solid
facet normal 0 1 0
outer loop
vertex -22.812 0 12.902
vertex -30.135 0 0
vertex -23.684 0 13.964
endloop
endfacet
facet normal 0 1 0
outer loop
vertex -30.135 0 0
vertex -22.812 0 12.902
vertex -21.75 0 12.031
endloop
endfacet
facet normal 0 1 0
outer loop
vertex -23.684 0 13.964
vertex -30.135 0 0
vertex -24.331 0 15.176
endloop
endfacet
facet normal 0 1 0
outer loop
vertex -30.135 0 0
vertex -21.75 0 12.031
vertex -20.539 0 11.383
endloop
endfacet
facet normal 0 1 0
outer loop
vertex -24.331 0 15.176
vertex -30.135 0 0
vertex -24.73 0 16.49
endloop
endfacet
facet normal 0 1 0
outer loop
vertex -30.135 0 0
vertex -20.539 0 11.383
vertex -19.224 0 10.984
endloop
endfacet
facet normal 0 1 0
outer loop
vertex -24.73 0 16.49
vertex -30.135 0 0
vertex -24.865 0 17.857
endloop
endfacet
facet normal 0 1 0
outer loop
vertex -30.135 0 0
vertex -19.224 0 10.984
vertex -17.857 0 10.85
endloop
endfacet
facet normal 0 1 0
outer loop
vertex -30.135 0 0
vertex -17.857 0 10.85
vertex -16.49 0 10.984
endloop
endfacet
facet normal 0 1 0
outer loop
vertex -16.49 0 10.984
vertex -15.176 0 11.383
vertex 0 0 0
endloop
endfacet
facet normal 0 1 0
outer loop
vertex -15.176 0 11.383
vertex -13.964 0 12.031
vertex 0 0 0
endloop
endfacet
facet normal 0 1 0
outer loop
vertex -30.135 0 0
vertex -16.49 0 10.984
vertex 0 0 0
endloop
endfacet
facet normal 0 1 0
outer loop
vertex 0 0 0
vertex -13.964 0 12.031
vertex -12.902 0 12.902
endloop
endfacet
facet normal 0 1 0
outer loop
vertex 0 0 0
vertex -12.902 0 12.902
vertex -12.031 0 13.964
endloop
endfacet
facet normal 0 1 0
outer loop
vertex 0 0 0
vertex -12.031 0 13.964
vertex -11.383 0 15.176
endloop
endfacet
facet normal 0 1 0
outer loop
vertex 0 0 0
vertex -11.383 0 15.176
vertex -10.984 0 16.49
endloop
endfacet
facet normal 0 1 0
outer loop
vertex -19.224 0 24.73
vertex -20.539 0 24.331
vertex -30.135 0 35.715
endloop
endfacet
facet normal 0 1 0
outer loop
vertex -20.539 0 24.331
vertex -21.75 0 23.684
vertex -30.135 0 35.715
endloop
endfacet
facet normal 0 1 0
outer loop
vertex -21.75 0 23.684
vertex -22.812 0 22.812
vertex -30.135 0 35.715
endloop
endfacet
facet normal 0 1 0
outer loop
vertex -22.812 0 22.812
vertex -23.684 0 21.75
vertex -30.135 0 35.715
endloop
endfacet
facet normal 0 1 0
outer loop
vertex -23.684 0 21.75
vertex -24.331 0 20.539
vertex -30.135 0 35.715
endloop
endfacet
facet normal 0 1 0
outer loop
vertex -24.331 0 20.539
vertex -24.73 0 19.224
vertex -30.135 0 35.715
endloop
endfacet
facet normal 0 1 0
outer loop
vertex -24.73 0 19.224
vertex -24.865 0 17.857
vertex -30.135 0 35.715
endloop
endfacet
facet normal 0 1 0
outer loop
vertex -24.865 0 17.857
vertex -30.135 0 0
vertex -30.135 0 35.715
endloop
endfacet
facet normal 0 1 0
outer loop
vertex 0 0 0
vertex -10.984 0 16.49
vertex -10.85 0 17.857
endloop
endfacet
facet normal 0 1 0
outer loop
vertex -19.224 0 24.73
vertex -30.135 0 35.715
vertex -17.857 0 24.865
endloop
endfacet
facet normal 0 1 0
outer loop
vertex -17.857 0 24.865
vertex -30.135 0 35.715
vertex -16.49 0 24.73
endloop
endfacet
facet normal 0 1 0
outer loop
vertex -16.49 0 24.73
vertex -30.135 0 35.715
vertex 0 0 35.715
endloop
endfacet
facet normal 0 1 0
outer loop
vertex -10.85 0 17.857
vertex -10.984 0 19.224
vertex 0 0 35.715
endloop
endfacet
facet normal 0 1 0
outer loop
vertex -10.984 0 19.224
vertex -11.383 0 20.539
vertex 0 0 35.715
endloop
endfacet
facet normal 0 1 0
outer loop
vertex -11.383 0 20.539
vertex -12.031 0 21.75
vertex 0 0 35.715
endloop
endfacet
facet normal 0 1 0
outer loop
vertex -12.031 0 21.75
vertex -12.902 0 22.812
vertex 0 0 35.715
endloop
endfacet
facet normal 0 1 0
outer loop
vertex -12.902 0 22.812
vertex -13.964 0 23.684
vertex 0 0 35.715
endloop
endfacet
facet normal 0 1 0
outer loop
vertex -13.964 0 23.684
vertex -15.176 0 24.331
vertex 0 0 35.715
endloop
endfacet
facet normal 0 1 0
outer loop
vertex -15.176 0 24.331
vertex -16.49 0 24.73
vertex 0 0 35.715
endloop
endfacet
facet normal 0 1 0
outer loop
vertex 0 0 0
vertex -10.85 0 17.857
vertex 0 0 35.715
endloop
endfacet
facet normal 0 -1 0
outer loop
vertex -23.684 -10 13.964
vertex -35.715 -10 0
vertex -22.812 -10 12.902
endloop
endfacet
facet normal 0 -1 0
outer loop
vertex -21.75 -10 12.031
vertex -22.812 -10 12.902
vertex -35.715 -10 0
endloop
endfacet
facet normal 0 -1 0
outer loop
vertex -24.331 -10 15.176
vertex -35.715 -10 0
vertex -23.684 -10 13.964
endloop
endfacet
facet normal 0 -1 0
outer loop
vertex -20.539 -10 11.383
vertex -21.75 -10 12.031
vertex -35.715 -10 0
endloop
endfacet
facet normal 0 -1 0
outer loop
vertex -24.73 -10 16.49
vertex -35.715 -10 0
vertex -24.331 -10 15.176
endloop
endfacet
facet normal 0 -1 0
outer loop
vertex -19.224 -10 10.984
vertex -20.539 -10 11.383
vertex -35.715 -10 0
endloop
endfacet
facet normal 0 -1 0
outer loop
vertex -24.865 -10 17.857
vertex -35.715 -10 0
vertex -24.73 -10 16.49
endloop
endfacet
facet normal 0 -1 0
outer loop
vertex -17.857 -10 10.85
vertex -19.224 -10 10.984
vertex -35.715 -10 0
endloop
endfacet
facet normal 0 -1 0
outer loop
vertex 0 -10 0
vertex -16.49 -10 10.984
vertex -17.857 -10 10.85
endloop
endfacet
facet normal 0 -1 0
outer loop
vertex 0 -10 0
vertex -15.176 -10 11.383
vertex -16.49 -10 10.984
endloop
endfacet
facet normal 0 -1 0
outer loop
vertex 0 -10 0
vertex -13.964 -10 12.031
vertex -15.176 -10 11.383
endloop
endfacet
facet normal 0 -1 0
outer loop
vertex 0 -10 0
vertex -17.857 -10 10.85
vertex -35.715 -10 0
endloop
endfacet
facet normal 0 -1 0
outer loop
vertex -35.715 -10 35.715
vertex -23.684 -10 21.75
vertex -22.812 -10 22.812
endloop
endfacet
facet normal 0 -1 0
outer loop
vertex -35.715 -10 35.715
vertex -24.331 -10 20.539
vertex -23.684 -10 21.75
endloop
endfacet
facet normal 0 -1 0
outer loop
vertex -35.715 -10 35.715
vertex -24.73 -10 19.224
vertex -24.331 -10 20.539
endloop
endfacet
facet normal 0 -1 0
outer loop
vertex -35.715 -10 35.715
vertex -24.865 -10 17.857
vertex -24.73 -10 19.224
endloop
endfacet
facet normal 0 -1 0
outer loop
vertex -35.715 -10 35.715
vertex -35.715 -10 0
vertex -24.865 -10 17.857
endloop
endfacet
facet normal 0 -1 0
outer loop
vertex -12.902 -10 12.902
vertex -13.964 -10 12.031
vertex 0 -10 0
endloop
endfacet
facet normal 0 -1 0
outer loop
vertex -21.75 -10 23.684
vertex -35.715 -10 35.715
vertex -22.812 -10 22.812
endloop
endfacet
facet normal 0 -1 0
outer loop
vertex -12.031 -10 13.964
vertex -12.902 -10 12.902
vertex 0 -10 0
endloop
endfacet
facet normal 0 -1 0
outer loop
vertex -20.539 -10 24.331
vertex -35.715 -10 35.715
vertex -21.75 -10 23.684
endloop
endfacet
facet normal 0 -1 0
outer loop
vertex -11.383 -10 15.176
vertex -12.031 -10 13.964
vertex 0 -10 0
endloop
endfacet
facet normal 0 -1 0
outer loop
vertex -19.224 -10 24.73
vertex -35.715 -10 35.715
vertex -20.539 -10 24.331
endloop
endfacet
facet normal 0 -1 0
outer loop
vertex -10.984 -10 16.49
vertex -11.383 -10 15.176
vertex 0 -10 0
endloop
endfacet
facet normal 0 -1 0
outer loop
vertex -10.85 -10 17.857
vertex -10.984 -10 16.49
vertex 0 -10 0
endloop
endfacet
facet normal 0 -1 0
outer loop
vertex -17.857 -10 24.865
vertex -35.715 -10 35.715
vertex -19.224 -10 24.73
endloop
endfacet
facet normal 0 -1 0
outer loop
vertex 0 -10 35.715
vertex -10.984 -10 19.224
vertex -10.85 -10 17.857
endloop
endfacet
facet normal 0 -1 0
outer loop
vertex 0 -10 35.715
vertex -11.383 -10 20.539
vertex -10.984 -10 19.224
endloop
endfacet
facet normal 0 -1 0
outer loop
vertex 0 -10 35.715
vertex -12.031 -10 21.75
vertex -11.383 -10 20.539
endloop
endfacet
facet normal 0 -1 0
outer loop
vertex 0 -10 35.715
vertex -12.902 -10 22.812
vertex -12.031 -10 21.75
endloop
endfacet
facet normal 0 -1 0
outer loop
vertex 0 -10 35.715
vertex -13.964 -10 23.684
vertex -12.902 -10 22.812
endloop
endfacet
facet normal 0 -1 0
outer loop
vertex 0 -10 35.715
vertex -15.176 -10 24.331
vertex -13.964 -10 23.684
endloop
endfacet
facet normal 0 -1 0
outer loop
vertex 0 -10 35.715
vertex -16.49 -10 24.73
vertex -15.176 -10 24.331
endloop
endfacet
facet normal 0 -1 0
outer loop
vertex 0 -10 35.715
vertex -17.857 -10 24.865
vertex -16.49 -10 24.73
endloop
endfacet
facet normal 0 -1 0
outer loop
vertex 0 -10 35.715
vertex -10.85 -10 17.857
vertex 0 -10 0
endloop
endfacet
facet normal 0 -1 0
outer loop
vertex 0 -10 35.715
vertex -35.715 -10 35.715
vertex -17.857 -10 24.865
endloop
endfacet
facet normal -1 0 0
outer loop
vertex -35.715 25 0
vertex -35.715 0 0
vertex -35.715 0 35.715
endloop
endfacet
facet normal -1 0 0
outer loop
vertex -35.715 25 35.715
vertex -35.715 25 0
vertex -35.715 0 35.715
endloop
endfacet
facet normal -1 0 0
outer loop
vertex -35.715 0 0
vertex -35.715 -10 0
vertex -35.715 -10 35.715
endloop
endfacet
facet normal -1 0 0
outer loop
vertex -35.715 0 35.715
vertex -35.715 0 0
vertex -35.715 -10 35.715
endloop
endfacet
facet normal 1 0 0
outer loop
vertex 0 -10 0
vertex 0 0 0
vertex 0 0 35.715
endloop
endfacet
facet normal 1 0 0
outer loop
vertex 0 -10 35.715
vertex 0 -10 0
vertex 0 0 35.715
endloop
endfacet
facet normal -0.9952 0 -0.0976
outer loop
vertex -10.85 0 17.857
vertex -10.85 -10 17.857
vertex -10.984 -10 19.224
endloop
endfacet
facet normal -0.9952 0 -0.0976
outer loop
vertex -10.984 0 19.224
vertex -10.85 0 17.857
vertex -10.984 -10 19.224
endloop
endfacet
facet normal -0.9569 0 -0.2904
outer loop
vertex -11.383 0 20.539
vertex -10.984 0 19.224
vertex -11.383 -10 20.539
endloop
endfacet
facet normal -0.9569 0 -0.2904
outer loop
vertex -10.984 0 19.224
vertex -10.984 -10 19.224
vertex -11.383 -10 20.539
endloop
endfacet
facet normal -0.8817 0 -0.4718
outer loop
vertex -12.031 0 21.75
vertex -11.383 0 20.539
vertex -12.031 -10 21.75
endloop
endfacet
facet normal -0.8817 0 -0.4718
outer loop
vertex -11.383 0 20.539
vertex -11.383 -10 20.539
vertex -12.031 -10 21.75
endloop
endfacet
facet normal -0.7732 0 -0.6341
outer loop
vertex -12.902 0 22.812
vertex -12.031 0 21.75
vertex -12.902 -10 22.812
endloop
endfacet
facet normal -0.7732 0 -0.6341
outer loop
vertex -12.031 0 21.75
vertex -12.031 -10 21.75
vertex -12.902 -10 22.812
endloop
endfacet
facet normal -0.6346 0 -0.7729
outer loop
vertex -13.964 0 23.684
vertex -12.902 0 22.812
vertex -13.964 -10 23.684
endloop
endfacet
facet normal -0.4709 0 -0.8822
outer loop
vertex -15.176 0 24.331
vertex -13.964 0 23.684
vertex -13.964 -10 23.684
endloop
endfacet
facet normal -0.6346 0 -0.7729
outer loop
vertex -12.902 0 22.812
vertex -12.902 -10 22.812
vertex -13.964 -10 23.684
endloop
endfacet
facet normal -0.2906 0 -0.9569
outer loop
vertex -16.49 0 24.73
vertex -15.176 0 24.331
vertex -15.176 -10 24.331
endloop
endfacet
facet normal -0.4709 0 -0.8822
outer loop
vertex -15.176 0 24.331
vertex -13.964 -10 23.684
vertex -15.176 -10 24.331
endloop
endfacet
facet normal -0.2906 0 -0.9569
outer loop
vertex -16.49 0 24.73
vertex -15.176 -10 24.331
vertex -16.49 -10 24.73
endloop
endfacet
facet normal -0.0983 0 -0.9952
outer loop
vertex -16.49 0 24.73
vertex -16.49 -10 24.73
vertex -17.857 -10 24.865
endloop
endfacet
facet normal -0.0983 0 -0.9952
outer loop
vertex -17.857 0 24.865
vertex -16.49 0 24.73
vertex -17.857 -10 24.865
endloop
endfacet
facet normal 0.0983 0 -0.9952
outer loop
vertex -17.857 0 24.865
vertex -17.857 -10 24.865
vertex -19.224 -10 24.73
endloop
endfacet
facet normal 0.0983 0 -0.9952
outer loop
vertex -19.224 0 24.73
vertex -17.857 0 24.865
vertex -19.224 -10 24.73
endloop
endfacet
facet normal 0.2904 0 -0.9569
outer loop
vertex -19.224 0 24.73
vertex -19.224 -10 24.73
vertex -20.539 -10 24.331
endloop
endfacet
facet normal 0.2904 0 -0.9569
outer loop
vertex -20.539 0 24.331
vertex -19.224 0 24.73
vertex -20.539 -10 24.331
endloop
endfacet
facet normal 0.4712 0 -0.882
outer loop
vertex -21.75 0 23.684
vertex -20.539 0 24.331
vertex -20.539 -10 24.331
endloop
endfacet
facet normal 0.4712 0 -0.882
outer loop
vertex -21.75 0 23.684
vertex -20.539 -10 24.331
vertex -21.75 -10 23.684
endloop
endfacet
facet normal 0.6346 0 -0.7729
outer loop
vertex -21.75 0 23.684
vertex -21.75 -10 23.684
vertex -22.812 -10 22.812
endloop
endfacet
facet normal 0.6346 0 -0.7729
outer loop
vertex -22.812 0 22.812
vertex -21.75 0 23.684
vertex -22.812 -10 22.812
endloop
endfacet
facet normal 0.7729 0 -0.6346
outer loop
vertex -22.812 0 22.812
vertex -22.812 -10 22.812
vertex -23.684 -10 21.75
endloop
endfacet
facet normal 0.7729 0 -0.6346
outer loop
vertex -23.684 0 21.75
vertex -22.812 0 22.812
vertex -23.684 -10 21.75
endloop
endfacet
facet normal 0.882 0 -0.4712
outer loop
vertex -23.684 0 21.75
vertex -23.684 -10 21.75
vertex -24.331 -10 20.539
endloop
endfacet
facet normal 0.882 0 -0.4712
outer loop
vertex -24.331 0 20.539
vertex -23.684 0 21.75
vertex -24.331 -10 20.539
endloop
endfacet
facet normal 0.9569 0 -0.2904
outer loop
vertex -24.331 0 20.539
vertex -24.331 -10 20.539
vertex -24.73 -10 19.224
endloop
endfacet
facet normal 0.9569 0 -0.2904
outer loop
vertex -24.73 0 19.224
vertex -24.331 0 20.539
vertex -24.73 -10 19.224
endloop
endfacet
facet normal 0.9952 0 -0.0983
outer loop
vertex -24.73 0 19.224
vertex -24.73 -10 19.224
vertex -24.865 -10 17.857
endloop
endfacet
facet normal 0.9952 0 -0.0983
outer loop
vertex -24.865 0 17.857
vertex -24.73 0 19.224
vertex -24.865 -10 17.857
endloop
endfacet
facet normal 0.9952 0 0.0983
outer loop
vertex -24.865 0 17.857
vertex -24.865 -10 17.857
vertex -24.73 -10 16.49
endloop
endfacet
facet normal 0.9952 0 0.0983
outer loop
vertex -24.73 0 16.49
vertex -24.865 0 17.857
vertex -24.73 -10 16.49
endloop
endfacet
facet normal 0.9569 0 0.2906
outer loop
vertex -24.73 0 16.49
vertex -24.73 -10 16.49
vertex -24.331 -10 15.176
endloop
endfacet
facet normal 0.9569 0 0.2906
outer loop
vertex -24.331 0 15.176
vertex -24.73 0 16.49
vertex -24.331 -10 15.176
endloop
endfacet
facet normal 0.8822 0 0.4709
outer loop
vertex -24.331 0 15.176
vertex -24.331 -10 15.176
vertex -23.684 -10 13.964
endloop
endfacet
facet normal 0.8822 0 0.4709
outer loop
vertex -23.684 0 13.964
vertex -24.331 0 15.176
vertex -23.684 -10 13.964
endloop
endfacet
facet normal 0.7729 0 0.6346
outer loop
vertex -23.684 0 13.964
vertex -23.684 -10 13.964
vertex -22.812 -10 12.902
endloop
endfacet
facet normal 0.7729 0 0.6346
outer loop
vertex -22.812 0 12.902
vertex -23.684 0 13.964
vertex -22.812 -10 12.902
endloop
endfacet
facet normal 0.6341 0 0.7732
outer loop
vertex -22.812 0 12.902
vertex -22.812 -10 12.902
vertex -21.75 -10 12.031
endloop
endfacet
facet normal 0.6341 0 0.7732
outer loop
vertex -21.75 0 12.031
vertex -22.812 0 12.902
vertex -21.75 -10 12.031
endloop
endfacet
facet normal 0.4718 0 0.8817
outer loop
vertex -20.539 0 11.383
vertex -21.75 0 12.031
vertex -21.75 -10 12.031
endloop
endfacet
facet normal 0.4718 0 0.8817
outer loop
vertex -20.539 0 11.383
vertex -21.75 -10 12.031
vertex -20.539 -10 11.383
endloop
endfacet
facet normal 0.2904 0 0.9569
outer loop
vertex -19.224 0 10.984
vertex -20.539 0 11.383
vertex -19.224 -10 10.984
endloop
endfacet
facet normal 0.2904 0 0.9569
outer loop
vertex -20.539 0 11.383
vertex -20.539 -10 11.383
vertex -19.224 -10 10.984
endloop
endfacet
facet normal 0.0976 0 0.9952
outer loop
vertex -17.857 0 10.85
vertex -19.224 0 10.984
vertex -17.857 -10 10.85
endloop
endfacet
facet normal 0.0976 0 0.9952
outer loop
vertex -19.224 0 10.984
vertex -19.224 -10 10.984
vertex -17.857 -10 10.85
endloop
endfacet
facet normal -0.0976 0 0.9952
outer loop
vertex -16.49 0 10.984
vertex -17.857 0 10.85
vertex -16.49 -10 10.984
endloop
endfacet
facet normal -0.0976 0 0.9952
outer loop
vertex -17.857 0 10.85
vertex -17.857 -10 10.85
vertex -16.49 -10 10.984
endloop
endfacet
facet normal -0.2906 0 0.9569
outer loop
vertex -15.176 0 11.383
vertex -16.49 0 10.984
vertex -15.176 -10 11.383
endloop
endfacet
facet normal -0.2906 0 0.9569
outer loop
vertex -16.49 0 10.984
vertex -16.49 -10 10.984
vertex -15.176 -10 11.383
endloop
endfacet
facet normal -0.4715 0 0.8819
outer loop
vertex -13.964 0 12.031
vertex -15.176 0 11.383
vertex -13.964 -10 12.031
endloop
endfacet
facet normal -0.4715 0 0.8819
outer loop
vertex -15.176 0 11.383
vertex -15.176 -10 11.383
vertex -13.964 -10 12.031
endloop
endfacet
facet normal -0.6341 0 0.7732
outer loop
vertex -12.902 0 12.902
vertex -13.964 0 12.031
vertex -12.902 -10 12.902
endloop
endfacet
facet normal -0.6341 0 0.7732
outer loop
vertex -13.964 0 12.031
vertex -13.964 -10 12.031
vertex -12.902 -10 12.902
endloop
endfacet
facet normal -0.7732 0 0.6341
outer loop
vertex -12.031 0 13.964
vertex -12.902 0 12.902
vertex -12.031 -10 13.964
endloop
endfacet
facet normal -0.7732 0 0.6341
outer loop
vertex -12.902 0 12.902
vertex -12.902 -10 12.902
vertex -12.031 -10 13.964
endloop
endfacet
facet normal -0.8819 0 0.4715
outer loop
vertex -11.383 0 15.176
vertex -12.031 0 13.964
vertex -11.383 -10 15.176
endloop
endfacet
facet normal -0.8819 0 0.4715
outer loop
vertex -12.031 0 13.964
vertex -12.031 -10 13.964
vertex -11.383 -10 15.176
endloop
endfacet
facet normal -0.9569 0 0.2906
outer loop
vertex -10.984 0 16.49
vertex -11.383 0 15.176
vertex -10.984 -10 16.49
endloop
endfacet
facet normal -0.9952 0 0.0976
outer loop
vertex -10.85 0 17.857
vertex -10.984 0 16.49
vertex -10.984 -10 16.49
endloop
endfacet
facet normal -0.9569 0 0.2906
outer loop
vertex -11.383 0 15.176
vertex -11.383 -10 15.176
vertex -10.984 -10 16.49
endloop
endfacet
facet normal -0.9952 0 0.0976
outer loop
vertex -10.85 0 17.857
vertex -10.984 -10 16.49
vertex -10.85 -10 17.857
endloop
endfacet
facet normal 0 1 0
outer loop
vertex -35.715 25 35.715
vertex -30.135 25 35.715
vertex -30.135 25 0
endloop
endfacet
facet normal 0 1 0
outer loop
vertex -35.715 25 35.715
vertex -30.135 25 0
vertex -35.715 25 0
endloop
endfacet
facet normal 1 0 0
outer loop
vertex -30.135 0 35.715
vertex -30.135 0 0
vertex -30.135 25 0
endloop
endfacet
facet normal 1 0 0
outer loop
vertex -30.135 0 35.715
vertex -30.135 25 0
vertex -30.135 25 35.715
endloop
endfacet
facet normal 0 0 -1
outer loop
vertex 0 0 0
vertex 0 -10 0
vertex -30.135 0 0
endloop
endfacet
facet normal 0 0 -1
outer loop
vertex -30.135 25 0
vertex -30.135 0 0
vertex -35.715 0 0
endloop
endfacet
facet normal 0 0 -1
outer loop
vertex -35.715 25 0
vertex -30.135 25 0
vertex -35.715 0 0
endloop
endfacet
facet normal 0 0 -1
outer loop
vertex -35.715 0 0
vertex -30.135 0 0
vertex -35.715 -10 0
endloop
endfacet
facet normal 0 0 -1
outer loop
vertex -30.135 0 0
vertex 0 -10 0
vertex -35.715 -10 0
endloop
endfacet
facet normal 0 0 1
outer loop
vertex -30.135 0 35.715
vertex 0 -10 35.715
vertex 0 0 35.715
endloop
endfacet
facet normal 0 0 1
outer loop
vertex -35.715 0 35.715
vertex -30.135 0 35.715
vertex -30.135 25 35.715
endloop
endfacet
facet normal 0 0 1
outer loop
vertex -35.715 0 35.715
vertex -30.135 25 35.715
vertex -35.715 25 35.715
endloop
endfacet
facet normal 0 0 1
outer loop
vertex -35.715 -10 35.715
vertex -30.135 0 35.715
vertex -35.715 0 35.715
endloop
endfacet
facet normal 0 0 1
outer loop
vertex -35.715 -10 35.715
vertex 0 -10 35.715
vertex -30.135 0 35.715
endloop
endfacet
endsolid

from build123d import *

# Parameters (mm, degrees)
F0_W     = 35.7145108283
F0_H     = 35.7145108283
F1_DEPTH = 10
F2_R     = 7.0075928512
F3_DEPTH = 25
F4_W     = 5.5791772902
F4_H     = 35.7145108283
F5_DEPTH = 25


with BuildPart() as f1:
    # F0 (on Front) → F1 (new body)
    with BuildSketch(Plane.XZ):
        with Locations((-17.8572554141, 17.8572554141)):
            Rectangle(F0_W, F0_H)
    extrude(amount=F1_DEPTH)

    # F2 (on face) → F3 (cut)
    with BuildSketch(Plane.XZ.offset(10)):
        with Locations((-17.8572554141, 17.8572554141)):
            Circle(F2_R)
    extrude(amount=-F3_DEPTH, mode=Mode.SUBTRACT)

    # F4 (on face) → F5 (join)
    with BuildSketch(Plane(origin=(0, 0, 0), x_dir=(-1, 0, 0), z_dir=(0, 1, 0))):
        with Locations((32.9249221832, 17.8572554141)):
            Rectangle(F4_W, F4_H)
    extrude(amount=F5_DEPTH)


solid = f1.part
